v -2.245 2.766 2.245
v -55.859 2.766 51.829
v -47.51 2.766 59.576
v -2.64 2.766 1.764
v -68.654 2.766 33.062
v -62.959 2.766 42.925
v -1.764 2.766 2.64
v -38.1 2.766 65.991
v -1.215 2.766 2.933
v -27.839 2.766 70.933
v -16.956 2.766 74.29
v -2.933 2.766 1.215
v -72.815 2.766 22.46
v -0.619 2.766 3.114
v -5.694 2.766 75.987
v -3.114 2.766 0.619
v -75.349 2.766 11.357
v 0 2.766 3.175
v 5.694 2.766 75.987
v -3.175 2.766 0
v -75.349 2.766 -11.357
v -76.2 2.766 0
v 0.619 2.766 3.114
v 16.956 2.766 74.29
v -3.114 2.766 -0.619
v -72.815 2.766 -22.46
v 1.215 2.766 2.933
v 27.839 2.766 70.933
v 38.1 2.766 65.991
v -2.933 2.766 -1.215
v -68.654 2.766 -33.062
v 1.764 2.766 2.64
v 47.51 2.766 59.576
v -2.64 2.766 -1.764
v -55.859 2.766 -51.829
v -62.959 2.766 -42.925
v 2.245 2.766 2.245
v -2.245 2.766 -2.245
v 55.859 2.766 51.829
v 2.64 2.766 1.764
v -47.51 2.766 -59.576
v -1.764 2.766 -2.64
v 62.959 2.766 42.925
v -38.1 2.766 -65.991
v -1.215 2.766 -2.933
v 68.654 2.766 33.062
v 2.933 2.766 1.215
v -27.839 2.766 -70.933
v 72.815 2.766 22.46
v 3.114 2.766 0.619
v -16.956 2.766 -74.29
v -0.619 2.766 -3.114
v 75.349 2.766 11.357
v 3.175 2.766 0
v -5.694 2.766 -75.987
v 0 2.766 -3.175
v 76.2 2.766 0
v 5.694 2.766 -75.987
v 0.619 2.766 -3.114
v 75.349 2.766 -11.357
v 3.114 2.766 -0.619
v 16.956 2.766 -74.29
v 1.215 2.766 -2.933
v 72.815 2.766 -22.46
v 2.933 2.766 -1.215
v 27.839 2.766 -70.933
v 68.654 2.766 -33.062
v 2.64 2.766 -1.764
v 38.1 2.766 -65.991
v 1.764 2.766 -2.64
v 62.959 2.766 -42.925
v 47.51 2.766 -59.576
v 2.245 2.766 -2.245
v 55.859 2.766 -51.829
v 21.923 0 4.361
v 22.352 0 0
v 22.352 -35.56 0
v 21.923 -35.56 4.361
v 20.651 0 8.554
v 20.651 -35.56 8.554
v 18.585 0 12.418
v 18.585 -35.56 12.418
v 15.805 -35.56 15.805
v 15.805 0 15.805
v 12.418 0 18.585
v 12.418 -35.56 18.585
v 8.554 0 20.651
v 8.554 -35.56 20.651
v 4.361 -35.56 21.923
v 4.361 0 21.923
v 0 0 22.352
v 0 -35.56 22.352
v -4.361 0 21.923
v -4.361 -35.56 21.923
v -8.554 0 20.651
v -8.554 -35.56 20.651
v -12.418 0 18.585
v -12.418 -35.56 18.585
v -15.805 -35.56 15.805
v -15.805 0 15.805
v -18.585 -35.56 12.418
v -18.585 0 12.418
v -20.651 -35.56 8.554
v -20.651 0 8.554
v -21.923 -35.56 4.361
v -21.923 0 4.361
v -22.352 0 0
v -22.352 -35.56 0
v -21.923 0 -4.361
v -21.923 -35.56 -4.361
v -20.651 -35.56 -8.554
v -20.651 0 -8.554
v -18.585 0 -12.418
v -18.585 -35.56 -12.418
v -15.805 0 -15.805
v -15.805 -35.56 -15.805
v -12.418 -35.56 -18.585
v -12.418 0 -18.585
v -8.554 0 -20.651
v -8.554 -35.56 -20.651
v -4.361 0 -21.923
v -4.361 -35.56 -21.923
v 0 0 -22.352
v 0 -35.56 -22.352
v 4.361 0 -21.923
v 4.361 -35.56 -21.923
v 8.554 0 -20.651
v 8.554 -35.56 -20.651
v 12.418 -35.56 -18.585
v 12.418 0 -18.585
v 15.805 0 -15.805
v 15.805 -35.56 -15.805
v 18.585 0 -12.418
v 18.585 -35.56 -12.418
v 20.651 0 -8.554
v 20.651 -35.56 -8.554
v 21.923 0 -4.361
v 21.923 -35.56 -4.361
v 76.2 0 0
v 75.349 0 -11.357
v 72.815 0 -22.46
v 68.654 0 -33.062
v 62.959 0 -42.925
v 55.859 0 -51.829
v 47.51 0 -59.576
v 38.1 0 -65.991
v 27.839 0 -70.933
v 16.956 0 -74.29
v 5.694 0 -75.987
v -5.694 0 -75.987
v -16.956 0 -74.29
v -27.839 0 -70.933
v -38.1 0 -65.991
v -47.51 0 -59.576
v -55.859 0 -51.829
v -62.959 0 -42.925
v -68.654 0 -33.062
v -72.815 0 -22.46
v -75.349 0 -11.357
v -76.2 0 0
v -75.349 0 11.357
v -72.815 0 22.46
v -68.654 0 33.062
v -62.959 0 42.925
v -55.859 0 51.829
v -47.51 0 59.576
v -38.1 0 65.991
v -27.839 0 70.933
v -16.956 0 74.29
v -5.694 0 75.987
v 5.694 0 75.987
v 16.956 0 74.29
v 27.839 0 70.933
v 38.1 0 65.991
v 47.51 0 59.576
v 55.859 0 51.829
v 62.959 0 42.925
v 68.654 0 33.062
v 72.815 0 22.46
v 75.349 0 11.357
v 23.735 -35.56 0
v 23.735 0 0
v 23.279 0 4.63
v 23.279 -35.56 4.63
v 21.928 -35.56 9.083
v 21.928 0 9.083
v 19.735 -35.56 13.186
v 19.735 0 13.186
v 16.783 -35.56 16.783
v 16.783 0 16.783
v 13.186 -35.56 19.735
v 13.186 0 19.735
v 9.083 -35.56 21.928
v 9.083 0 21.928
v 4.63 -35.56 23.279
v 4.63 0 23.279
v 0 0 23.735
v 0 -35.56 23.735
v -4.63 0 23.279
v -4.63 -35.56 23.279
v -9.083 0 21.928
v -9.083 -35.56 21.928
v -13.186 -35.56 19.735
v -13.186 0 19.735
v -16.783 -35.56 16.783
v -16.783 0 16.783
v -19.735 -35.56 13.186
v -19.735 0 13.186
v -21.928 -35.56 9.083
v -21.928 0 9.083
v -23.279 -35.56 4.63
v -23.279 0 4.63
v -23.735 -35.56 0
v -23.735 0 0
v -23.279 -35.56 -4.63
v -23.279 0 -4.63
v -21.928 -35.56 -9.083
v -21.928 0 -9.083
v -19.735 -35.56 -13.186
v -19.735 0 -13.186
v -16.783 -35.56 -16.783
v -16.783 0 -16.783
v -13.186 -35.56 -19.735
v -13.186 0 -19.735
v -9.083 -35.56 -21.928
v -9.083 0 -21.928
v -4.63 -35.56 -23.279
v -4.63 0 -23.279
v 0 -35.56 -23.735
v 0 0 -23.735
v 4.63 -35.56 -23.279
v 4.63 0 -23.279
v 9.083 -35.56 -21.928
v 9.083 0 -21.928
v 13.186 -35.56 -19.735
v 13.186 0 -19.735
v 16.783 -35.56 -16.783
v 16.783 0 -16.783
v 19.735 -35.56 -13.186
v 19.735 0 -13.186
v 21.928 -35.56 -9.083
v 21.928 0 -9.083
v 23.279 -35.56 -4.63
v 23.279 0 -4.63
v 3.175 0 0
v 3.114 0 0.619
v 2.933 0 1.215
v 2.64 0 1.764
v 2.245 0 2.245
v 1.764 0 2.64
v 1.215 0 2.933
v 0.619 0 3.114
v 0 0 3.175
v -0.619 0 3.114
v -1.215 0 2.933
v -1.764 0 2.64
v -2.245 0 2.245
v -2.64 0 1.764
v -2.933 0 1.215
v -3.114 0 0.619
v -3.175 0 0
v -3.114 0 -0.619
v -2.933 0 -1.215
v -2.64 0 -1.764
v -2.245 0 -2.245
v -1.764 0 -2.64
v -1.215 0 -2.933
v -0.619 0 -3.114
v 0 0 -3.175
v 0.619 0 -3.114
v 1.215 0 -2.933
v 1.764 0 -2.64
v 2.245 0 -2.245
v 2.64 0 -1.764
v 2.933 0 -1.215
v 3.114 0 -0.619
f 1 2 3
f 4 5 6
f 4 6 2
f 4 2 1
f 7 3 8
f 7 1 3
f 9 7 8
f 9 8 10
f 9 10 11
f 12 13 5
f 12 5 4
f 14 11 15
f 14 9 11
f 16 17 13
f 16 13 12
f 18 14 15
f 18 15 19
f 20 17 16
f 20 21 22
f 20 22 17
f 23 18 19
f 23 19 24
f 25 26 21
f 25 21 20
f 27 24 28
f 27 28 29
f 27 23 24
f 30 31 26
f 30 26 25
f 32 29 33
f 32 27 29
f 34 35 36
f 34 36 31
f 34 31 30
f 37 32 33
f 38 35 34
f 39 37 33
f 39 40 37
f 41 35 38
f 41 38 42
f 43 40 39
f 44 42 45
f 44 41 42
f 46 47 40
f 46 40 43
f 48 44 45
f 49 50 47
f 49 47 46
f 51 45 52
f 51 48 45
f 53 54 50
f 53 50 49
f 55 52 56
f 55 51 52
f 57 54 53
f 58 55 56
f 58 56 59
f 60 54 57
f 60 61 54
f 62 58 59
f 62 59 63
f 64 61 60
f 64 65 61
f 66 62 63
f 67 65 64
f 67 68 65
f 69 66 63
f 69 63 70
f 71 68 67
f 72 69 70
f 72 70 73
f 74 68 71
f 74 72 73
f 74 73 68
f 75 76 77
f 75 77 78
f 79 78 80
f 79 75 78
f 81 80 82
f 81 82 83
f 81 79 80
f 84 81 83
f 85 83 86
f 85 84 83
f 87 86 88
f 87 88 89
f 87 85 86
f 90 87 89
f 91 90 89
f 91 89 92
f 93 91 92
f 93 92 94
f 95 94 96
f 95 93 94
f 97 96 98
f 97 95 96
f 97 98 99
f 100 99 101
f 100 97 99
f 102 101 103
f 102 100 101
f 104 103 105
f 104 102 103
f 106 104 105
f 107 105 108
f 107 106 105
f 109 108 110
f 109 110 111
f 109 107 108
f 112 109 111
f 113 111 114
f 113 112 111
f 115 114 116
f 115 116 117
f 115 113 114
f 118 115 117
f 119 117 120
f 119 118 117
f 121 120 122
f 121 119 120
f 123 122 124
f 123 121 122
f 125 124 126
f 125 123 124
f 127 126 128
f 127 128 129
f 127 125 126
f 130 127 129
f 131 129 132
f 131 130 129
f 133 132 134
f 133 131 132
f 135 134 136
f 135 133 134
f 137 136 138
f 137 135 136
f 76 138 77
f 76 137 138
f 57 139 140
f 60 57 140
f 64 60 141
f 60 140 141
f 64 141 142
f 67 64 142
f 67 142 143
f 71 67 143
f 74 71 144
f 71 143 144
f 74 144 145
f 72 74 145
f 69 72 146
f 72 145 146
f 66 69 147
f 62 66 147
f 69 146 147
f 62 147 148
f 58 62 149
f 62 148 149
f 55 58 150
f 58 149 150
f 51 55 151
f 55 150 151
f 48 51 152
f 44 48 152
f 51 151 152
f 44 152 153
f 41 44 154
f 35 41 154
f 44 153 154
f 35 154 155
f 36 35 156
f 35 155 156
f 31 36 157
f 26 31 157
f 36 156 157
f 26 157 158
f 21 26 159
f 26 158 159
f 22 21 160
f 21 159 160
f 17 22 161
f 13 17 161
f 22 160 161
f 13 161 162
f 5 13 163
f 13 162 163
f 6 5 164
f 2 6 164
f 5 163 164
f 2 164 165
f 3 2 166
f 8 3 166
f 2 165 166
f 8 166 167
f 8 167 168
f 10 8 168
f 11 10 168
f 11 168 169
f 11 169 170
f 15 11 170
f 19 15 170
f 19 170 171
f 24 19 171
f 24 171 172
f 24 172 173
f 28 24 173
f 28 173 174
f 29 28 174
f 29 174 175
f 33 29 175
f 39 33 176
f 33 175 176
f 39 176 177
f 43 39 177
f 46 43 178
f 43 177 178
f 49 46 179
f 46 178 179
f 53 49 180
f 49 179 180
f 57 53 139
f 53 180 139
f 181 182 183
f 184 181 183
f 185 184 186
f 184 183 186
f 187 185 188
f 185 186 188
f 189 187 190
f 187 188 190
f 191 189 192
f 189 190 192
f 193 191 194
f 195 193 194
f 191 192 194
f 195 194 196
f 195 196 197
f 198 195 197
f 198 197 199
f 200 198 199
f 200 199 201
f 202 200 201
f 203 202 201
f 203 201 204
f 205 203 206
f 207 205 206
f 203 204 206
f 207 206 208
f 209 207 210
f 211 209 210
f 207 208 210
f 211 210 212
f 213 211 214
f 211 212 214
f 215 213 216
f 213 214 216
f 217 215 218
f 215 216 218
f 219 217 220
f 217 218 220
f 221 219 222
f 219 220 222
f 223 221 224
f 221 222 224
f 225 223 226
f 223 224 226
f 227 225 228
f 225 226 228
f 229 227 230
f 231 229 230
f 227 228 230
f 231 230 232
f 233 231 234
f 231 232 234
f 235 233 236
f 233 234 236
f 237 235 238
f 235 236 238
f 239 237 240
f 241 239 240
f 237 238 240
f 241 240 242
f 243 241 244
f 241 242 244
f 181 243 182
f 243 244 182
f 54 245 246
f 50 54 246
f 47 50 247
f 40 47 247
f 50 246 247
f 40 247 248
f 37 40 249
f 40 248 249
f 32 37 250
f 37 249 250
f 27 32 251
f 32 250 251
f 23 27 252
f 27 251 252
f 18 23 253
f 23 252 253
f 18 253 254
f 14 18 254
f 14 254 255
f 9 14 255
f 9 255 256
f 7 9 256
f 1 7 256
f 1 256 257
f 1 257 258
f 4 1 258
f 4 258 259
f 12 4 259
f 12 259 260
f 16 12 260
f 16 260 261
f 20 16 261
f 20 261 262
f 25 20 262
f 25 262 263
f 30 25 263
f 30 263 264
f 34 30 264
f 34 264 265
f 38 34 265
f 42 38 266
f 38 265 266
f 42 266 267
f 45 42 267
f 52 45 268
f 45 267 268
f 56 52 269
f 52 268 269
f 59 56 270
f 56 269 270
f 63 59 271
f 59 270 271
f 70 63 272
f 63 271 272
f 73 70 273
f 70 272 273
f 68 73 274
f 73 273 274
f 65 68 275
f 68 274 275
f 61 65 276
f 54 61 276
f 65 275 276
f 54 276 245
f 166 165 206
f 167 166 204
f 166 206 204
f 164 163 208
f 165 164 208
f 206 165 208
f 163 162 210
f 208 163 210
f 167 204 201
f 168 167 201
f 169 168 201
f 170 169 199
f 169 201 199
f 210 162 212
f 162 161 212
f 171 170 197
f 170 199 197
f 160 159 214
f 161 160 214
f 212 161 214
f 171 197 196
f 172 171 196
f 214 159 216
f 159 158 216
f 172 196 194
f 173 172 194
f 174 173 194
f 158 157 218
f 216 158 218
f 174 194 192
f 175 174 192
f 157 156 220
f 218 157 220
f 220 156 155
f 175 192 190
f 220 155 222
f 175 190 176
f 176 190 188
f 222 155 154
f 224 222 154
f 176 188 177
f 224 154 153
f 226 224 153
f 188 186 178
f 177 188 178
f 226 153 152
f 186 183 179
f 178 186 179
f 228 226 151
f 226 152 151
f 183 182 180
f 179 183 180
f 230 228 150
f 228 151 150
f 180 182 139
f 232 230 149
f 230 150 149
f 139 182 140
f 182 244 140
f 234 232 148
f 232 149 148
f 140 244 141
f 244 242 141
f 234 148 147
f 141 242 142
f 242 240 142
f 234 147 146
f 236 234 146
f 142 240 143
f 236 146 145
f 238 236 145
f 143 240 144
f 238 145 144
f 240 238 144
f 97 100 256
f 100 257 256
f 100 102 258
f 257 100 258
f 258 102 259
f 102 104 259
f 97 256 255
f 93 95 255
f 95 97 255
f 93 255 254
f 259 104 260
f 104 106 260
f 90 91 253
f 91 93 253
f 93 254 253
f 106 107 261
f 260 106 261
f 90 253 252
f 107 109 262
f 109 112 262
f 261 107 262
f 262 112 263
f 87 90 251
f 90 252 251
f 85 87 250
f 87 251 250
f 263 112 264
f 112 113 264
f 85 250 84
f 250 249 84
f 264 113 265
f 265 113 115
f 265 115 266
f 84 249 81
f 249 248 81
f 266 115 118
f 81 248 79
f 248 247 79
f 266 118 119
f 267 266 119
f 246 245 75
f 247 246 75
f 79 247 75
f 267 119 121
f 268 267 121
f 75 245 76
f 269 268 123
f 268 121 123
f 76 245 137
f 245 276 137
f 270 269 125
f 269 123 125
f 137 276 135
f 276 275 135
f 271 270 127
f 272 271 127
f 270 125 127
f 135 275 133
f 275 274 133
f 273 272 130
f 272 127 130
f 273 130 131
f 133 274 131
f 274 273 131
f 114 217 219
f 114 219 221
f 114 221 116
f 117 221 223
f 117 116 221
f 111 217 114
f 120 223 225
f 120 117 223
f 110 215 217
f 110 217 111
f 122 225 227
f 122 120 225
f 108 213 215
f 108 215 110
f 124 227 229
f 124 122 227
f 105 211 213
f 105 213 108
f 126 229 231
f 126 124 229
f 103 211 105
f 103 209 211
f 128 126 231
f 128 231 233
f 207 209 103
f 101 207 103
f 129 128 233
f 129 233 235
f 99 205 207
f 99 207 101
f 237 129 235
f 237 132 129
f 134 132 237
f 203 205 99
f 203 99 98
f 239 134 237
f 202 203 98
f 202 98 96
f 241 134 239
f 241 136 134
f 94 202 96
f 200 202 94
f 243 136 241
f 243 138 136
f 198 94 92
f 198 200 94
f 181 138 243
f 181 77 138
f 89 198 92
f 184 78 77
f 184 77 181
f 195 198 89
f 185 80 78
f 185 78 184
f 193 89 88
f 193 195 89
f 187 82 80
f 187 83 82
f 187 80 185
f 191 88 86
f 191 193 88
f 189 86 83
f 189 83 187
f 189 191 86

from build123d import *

# Parameters (mm, degrees)
SKETCH1_R           = 76.2
BOSS_EXTRUDE1_DEPTH = 2.76606
SKETCH4_R           = 23.73503
SKETCH4_R_2         = 22.352
BOSS_EXTRUDE3_DEPTH = 35.56
SKETCH5_R           = 3.175
CUT_EXTRUDE1_DEPTH  = 3.76606


with BuildPart() as part:
    # Sketch1 → Boss-Extrude1 (new body)
    with BuildSketch(Plane(origin=(0, 0, 0), x_dir=(1, 0, 0), z_dir=(0, 1, 0))):
        Circle(SKETCH1_R)
    extrude(amount=BOSS_EXTRUDE1_DEPTH)

    # Sketch4 → Boss-Extrude3 (add)
    with BuildSketch(Plane.XZ):
        Circle(SKETCH4_R)
        Circle(SKETCH4_R_2, mode=Mode.SUBTRACT)
    extrude(amount=BOSS_EXTRUDE3_DEPTH)

    # Sketch5 → Cut-Extrude1 (cut, through all)
    with BuildSketch(Plane.XZ):
        Circle(SKETCH5_R)
    extrude(amount=-CUT_EXTRUDE1_DEPTH, mode=Mode.SUBTRACT)


solid = part.part
